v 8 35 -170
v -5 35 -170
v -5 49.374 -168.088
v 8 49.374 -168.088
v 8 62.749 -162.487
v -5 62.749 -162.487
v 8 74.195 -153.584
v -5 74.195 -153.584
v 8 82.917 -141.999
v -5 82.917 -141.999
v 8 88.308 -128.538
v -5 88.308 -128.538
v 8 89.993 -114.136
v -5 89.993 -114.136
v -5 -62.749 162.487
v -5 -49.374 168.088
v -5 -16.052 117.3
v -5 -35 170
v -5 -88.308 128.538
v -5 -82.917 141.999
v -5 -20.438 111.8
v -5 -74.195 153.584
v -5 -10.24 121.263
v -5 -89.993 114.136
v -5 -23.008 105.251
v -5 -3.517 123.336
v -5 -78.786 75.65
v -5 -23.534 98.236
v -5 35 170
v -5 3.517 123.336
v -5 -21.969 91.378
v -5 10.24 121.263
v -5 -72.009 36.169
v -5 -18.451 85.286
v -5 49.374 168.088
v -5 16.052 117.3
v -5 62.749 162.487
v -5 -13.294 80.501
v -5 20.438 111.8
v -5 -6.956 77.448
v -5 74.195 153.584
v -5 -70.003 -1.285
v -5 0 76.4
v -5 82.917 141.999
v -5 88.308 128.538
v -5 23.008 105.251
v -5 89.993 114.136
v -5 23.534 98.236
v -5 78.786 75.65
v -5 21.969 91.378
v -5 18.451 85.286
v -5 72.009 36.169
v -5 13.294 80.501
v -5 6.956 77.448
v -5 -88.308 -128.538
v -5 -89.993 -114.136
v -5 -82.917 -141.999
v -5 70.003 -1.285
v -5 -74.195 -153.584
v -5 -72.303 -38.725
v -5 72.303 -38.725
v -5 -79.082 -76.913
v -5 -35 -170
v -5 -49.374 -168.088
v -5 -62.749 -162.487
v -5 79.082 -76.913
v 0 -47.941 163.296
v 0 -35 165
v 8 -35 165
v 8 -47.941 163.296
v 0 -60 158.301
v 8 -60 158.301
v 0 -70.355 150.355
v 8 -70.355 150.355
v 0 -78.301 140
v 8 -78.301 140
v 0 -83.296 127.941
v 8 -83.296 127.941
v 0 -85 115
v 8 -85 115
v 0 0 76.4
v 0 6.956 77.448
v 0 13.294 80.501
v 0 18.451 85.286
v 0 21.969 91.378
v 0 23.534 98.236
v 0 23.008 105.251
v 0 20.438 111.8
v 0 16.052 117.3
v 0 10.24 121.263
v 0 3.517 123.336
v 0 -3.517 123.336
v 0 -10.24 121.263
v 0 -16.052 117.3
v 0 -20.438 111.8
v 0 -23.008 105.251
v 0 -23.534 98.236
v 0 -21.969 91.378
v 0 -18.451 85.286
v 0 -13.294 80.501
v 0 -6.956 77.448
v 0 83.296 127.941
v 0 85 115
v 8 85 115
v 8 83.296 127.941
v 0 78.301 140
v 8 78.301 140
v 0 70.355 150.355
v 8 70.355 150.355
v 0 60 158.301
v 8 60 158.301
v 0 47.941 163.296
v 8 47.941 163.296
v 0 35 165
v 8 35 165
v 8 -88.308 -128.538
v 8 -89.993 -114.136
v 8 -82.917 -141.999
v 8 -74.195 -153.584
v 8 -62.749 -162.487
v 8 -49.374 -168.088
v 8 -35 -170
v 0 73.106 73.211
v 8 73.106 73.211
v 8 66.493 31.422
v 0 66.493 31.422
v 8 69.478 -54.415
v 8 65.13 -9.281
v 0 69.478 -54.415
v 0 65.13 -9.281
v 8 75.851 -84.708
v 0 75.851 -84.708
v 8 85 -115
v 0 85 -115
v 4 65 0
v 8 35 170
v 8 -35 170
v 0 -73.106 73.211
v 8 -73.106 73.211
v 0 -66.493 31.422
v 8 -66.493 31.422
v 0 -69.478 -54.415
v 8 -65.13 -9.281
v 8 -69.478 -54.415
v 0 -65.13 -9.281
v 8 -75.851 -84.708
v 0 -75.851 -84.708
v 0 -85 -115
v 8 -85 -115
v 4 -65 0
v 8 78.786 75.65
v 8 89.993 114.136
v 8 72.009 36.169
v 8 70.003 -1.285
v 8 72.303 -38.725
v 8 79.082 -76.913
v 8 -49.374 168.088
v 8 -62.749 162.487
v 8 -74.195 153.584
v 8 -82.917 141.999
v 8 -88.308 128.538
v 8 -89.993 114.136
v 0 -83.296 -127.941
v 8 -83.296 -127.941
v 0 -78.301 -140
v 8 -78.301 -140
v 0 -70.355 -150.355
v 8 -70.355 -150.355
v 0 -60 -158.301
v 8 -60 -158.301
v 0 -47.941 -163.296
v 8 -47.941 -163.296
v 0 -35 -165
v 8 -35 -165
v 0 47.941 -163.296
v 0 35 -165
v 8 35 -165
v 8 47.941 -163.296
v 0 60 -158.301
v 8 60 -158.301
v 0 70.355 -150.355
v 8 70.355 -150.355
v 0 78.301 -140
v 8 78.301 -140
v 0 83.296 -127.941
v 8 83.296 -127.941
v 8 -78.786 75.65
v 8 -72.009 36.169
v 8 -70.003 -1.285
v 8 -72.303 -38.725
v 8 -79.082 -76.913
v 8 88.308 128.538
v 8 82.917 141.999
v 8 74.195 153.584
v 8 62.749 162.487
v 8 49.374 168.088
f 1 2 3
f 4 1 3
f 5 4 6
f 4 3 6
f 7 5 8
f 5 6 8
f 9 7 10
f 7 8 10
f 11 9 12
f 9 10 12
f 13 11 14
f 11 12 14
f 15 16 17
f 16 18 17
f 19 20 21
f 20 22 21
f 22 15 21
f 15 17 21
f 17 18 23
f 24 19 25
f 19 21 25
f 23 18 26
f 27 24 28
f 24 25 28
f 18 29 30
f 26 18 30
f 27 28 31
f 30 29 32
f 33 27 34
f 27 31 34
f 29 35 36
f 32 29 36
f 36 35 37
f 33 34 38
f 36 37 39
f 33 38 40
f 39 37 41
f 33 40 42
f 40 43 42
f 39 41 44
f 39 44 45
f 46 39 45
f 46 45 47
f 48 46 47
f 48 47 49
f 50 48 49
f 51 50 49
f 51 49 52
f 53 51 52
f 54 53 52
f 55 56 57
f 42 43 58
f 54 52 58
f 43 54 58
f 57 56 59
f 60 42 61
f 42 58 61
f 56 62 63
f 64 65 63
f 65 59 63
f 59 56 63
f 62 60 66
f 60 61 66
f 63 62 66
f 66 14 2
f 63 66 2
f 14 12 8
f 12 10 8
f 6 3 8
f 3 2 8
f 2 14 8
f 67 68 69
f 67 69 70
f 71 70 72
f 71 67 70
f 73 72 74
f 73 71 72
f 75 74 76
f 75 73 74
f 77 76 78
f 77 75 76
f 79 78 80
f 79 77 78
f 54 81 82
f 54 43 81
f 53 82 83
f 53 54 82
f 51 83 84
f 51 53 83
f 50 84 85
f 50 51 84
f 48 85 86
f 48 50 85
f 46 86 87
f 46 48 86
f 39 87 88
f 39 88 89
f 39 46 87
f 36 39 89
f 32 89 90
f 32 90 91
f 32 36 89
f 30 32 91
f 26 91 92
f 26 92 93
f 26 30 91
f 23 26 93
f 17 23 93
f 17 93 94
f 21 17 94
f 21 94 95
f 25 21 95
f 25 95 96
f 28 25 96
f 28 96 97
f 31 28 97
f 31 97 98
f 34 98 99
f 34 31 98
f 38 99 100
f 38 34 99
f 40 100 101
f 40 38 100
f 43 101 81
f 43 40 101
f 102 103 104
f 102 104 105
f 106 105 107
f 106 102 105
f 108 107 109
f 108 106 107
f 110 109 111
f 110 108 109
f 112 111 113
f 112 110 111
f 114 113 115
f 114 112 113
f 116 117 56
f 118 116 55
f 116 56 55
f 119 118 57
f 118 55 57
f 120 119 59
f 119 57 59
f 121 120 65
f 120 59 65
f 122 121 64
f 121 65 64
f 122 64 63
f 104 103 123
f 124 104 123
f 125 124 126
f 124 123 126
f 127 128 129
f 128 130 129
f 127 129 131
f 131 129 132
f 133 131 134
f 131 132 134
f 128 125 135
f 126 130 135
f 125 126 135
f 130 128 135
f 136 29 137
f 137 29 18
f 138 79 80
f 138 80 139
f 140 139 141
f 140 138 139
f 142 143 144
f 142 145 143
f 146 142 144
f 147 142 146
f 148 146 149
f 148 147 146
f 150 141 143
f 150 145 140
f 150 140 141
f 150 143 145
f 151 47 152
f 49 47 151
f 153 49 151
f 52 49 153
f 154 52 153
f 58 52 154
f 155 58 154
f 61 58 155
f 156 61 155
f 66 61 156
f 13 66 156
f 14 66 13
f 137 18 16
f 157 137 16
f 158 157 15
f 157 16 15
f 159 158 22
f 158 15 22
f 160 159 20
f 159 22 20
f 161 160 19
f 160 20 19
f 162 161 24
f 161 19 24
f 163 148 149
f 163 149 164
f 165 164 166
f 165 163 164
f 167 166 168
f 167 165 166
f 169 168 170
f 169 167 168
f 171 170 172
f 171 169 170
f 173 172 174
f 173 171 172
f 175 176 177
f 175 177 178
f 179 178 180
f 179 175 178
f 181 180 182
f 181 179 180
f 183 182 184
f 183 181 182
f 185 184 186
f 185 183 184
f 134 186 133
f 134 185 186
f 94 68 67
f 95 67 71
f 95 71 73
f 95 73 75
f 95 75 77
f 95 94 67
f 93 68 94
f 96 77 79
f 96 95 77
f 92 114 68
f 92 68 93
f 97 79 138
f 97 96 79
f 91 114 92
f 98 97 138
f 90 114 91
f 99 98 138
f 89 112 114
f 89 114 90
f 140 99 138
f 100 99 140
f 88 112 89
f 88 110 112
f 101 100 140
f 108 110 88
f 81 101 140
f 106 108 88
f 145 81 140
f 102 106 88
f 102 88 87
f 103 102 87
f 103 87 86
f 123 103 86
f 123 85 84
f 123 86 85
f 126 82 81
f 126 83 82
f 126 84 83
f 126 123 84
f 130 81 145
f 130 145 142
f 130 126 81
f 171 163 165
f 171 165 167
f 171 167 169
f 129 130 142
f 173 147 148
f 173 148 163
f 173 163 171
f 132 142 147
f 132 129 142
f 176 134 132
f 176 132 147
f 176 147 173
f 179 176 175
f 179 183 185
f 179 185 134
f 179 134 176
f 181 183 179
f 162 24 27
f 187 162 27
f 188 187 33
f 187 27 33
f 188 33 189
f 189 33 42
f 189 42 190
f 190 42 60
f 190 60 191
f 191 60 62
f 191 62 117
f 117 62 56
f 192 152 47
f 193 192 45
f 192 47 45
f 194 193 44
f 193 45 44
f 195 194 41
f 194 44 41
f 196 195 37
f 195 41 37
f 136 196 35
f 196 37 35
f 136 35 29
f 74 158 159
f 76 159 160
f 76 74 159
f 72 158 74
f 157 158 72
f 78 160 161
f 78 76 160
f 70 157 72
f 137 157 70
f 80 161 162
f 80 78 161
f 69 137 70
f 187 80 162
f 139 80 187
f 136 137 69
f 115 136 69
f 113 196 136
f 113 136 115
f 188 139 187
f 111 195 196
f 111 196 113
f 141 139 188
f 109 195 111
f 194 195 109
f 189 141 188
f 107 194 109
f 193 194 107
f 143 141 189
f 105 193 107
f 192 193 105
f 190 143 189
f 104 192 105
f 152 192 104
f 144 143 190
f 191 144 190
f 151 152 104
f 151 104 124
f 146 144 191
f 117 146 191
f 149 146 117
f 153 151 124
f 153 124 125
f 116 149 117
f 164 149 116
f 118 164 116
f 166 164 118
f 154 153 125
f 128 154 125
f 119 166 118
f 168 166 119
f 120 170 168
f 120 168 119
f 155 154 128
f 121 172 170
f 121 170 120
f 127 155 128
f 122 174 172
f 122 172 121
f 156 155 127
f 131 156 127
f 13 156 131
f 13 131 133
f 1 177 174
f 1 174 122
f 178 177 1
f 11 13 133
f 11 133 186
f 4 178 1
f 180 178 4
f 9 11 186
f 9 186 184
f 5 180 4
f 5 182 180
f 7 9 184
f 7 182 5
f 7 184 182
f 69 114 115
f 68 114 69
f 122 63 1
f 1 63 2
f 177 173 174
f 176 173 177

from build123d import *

# Parameters (mm, degrees)
CROQUIS1_R              = 23.6
SALIENTE_EXTRUIR1_DEPTH = 8
VACIADO1_T              = 5
CORTAR_EXTRUIR1_START   = -214
CROQUIS2_R              = 23.6
CORTAR_EXTRUIR1_DEPTH   = 214


with BuildPart() as part:
    # Croquis1 → Saliente-Extruir1 (new body)
    with BuildSketch(Plane(origin=(0, 0, 0), x_dir=(0, 0, -1), z_dir=(1, 0, 0))):
        with BuildLine():
            Line((165, -35), (165, 35))
            ThreePointArc((165, 35), (150.355339059, 70.355339059), (115, 85))
            add(Edge.make_bspline(
                [(-115, 85), (0, 45), (115, 85)],
                knots=[0, 0, 0, 1, 1, 1], degree=2))
            ThreePointArc((-115, 85), (-150.355339059, 70.355339059), (-165, 35))
            Line((-165, 35), (-165, -35))
            ThreePointArc((-165, -35), (-150.355339059, -70.355339059), (-115, -85))
            add(Edge.make_bspline(
                [(-115, -85), (0, -45), (115, -85)],
                knots=[0, 0, 0, 1, 1, 1], degree=2))
            ThreePointArc((115, -85), (150.355339059, -70.355339059), (165, -35))
        make_face()
        with Locations((-100, 0)):
            Circle(CROQUIS1_R, mode=Mode.SUBTRACT)
    extrude(amount=SALIENTE_EXTRUIR1_DEPTH)

    # Vaciado1
    vaciado1_openings = [part.faces().sort_by_distance(p)[0] for p in [
        (8, 0, -3.797931414),
    ]]
    offset(amount=VACIADO1_T, openings=vaciado1_openings, kind=Kind.INTERSECTION)

    # Croquis2 → Cortar-Extruir1 (cut)
    with BuildSketch(Plane(origin=(8, 0, 0), x_dir=(0, 0, -1), z_dir=(1, 0, 0)).offset(CORTAR_EXTRUIR1_START)):
        with Locations((-100, 0)):
            Circle(CROQUIS2_R)
    extrude(amount=CORTAR_EXTRUIR1_DEPTH, mode=Mode.SUBTRACT)


solid = part.part
